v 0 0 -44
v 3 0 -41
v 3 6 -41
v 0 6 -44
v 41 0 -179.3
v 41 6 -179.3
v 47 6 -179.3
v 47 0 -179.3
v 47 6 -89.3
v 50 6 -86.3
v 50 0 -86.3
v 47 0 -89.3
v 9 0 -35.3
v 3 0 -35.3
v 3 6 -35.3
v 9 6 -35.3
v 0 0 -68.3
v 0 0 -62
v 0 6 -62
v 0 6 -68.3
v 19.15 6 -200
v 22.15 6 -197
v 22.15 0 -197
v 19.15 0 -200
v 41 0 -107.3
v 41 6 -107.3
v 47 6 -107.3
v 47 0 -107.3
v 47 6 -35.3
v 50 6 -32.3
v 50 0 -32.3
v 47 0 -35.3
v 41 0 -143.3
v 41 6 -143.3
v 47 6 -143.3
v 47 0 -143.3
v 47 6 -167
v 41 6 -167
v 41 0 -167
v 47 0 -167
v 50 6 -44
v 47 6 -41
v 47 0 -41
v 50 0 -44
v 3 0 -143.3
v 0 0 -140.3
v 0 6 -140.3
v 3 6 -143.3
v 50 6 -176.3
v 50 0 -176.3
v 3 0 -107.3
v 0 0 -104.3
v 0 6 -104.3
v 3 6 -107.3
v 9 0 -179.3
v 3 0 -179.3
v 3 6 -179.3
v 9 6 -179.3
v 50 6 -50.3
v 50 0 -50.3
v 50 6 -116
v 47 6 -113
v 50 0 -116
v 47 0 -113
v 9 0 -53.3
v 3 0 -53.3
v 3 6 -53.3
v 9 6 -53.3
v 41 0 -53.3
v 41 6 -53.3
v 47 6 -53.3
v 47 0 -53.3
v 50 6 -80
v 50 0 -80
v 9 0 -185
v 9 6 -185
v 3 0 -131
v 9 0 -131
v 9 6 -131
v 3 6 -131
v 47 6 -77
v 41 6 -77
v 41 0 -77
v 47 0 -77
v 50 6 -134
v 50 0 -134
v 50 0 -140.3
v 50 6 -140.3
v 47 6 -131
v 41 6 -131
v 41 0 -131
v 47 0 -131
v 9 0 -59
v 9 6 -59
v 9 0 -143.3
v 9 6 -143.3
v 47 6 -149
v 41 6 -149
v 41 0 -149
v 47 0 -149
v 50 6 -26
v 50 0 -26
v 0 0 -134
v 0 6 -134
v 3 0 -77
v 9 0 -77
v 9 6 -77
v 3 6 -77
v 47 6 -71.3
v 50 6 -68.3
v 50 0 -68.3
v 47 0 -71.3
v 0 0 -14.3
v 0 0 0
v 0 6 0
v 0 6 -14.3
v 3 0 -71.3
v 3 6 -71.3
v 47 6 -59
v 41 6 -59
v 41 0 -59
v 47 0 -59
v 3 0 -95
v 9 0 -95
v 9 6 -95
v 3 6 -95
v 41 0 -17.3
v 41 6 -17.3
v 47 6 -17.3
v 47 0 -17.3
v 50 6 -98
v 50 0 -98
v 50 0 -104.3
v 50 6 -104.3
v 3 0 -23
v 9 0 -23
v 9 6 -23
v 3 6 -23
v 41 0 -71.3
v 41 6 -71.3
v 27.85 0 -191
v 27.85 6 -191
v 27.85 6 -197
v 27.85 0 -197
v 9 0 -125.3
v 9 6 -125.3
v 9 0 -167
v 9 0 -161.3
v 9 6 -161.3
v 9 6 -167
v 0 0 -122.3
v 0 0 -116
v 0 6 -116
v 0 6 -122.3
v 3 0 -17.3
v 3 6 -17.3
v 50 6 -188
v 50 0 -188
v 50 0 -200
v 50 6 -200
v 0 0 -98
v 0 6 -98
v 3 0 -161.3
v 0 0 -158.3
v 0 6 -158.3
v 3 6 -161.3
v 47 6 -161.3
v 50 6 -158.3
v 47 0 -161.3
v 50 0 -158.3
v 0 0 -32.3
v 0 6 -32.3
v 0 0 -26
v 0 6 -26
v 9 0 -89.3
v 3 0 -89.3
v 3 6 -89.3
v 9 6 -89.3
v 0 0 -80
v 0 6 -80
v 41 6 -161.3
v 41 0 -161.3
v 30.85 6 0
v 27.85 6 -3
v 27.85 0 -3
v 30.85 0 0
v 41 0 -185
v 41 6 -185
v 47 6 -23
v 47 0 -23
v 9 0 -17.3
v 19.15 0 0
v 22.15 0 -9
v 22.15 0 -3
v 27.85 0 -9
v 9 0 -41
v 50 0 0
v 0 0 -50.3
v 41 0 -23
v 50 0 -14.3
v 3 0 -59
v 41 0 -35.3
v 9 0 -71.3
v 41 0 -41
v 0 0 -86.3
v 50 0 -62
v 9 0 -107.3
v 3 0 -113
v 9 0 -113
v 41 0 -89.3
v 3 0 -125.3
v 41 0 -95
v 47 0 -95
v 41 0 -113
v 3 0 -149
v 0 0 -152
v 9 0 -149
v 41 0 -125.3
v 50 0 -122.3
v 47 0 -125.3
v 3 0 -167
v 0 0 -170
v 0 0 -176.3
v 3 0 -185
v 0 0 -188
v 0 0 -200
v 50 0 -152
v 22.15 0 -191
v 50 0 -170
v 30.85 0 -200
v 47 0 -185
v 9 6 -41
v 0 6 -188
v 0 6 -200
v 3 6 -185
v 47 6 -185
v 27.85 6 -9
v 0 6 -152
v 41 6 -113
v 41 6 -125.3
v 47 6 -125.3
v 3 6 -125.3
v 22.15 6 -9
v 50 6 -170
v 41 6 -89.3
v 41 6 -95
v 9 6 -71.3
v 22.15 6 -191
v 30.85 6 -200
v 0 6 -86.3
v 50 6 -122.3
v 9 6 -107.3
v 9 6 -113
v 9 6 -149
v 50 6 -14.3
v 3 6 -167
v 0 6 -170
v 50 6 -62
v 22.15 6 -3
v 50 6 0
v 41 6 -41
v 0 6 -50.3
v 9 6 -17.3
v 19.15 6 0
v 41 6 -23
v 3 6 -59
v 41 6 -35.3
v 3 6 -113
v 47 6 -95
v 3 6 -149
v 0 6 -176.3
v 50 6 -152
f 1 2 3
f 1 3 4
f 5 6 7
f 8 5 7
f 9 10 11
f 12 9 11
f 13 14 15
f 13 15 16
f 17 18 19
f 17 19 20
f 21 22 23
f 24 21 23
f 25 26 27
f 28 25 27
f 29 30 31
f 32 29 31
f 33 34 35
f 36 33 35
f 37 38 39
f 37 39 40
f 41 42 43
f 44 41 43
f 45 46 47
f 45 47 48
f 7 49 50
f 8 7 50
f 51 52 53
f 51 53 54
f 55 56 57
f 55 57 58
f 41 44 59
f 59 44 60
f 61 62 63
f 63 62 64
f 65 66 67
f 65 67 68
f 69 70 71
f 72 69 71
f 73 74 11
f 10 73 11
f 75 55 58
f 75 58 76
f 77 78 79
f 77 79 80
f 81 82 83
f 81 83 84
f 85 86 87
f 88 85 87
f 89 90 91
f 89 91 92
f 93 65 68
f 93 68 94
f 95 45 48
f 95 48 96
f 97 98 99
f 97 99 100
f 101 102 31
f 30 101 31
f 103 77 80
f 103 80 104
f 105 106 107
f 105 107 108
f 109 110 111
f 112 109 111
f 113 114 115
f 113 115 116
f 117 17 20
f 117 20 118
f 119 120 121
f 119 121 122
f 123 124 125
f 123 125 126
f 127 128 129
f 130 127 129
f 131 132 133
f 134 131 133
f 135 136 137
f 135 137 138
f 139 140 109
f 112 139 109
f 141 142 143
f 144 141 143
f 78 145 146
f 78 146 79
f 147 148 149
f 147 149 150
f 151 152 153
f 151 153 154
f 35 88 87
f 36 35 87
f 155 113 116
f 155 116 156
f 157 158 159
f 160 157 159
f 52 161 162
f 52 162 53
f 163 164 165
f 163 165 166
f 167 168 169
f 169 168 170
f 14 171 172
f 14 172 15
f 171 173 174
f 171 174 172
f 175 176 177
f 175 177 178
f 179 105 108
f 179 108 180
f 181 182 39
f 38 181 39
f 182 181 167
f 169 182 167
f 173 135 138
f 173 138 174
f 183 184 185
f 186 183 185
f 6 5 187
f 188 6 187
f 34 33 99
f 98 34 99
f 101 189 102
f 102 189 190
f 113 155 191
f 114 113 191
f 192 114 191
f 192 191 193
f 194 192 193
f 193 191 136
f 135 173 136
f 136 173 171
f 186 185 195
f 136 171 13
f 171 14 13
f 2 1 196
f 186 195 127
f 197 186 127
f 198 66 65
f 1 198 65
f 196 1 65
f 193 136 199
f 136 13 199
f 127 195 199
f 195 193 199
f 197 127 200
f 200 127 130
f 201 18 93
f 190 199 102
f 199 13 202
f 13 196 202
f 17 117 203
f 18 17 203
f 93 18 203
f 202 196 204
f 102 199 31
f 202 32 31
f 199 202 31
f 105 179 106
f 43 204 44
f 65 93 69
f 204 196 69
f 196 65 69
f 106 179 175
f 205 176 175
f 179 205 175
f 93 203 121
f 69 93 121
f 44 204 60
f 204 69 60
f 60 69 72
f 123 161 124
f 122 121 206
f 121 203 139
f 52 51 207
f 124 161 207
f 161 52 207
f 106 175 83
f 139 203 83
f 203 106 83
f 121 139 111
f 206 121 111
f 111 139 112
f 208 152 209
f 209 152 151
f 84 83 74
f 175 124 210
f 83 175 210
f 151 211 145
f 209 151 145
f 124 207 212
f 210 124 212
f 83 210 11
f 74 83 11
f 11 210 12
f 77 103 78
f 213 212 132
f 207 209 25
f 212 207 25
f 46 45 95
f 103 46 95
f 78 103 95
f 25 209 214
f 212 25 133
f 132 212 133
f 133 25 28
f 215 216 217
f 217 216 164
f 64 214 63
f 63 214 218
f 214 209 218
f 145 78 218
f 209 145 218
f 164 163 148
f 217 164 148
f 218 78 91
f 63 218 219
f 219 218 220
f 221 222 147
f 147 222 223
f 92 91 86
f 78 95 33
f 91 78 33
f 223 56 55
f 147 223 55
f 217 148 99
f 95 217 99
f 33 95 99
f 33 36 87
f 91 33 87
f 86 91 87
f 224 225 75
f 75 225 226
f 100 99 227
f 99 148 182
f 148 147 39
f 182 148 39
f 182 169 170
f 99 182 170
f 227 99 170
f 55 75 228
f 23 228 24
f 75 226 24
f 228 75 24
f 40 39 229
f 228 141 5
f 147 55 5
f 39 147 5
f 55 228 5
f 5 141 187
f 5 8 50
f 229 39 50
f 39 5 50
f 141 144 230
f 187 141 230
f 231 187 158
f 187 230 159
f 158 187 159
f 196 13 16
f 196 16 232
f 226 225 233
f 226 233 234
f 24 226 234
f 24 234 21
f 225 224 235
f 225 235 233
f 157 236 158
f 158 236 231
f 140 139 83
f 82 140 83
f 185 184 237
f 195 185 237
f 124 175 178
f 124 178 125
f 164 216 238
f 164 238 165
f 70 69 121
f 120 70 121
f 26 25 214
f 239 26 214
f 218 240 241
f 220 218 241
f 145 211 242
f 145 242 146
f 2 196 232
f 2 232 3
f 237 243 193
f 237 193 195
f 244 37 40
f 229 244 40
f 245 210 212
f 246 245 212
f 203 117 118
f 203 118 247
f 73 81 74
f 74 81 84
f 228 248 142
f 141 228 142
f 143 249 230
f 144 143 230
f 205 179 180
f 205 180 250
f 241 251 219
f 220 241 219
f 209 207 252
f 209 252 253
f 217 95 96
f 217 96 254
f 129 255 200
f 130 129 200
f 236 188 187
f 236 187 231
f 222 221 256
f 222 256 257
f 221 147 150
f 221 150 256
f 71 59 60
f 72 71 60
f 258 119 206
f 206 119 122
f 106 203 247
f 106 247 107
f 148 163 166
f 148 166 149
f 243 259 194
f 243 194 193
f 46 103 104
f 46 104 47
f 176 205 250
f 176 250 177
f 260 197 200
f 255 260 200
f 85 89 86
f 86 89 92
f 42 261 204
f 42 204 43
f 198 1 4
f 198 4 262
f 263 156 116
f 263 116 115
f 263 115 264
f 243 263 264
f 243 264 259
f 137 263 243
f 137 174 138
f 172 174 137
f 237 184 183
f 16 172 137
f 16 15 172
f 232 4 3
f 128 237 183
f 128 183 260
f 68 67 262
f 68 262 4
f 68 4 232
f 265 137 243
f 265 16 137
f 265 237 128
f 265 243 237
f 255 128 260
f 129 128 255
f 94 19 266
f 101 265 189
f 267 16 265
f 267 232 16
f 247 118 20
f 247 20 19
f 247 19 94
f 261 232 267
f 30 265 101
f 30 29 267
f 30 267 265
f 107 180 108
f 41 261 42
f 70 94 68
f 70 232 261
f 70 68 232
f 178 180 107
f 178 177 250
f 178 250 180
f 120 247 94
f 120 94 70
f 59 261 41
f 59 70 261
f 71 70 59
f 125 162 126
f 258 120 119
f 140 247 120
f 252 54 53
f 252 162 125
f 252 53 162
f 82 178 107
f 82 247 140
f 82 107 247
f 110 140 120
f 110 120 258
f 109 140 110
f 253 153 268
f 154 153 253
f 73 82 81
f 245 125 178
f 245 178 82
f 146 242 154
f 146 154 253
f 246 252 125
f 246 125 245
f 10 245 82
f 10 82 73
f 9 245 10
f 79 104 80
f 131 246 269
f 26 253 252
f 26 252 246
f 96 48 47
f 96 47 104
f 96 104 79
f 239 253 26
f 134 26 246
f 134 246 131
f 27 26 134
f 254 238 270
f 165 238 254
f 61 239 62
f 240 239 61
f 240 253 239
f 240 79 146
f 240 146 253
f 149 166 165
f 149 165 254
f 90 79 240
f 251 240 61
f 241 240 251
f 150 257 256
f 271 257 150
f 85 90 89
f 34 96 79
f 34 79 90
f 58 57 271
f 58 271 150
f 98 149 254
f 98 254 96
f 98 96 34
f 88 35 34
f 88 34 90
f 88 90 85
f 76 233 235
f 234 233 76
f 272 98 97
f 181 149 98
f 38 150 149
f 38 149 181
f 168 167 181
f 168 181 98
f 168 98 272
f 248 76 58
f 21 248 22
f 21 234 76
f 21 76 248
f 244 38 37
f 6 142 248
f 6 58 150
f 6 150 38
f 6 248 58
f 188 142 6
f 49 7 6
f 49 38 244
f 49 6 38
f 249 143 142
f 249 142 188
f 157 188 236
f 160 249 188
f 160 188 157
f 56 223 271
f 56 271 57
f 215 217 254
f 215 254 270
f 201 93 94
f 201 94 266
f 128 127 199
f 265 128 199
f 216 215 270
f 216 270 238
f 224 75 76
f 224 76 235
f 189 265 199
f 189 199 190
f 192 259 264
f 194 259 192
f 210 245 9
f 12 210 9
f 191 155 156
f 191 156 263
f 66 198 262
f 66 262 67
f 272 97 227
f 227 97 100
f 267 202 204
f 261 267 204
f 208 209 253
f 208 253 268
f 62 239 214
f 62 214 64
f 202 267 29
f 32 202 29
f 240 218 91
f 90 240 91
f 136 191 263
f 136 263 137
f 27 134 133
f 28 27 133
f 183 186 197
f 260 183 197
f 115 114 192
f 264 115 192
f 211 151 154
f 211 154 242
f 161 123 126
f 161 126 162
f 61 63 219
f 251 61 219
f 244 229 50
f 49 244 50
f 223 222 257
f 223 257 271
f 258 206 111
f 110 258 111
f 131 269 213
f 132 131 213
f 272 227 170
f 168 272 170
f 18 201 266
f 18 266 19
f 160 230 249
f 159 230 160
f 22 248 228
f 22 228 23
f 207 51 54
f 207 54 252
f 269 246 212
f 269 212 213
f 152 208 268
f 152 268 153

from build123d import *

# Parameters (mm, degrees)
SKETCH1_W                  = 50
SKETCH1_H                  = 200
BOSS_EXTRUDE1_DEPTH        = 6
SKETCH2_W                  = 5.7
SKETCH2_H                  = 9
CUT_EXTRUDE1_DEPTH         = 6
CHAMFER2_SIZE              = 3
SKETCH3_W                  = 9
SKETCH3_H                  = 5.7
CUT_EXTRUDE2_DEPTH         = 10
CHAMFER3_SIZE              = 3
LPATTERN1_COUNT            = 10
LPATTERN1_PITCH            = 18
CHAMFER3_OF_LPATTERN1_SIZE = 3
MIRROR3_DEPTH              = 6


# Read off the part's stored shape, not the designer's step: Mirror3
with BuildPart() as part:
    # Sketch1 → Boss-Extrude1 (new body)
    with BuildSketch(Plane(origin=(0, 0, 0), x_dir=(1, 0, 0), z_dir=(0, 1, 0))):
        with Locations((25, 100)):
            Rectangle(SKETCH1_W, SKETCH1_H)
    extrude(amount=BOSS_EXTRUDE1_DEPTH)

    # Sketch2 → Cut-Extrude1 (cut)
    with BuildSketch(Plane(origin=(0, 6, 0), x_dir=(1, 0, 0), z_dir=(0, 1, 0))):
        with Locations((25, 195.5)):
            Rectangle(SKETCH2_W, SKETCH2_H)
        with Locations((25, 4.5)):
            Rectangle(SKETCH2_W, SKETCH2_H)
    extrude(amount=-CUT_EXTRUDE1_DEPTH, mode=Mode.SUBTRACT)

    # Chamfer2
    chamfer2_edges = [part.edges().sort_by_distance(p)[0] for p in [
        (22.15, 3, -200),
        (27.85, 3, -200),
        (27.85, 3, 0),
        (22.15, 3, 0),
    ]]
    chamfer(chamfer2_edges, length=CHAMFER2_SIZE)

    # Sketch3 → Cut-Extrude2 (cut)
    with BuildSketch(Plane(origin=(0, 6, 0), x_dir=(1, 0, 0), z_dir=(0, 1, 0))):
        with Locations((45.5, 182.15)):
            Rectangle(SKETCH3_W, SKETCH3_H)
    cut_extrude2 = extrude(amount=-CUT_EXTRUDE2_DEPTH, mode=Mode.SUBTRACT)

    # Chamfer3
    chamfer3_edges = [part.edges().sort_by_distance(p)[0] for p in [
        (50, 3, -185),
        (50, 3, -179.3),
    ]]
    chamfer(chamfer3_edges, length=CHAMFER3_SIZE)

    # LPattern1: Cut-Extrude2 ×10
    with Locations(*[(0, 0, i * LPATTERN1_PITCH) for i in range(1, LPATTERN1_COUNT)]):
        add(cut_extrude2, mode=Mode.SUBTRACT)

    # Chamfer3 of LPattern1
    chamfer3_of_lpattern1_edges = [part.edges().sort_by_distance(p)[0] for p in [
        (50, 3, -167),
        (50, 3, -161.3),
        (50, 3, -149),
        (50, 3, -143.3),
        (50, 3, -131),
        (50, 3, -125.3),
        (50, 3, -113),
        (50, 3, -107.3),
        (50, 3, -95),
        (50, 3, -89.3),
        (50, 3, -77),
        (50, 3, -71.3),
        (50, 3, -59),
        (50, 3, -53.3),
        (50, 3, -41),
        (50, 3, -35.3),
        (50, 3, -23),
        (50, 3, -17.3),
    ]]
    chamfer(chamfer3_of_lpattern1_edges, length=CHAMFER3_OF_LPATTERN1_SIZE)

    # Mirror3 outline → Mirror3 (cut)
    with BuildSketch(Plane(origin=(0, 0, 0), x_dir=(1, 0, 0), z_dir=(0, 1, 0))):
        Polygon((0, 176.3), (3, 179.3), (9, 179.3), (9, 185), (3, 185), (0, 188), align=None)
        Polygon((3, 23), (0, 26), (0, 14.3), (3, 17.3), (9, 17.3), (9, 23), align=None)
        Polygon((3, 41), (0, 44), (0, 32.3), (3, 35.3), (9, 35.3), (9, 41), align=None)
        Polygon((3, 59), (0, 62), (0, 50.3), (3, 53.3), (9, 53.3), (9, 59), align=None)
        Polygon((3, 77), (0, 80), (0, 68.3), (3, 71.3), (9, 71.3), (9, 77), align=None)
        Polygon((3, 95), (0, 98), (0, 86.3), (3, 89.3), (9, 89.3), (9, 95), align=None)
        Polygon((3, 113), (0, 116), (0, 104.3), (3, 107.3), (9, 107.3), (9, 113), align=None)
        Polygon((3, 131), (0, 134), (0, 122.3), (3, 125.3), (9, 125.3), (9, 131), align=None)
        Polygon((3, 149), (0, 152), (0, 140.3), (3, 143.3), (9, 143.3), (9, 149), align=None)
        Polygon((3, 167), (0, 170), (0, 158.3), (3, 161.3), (9, 161.3), (9, 167), align=None)
    extrude(amount=MIRROR3_DEPTH, mode=Mode.SUBTRACT)


solid = part.part
